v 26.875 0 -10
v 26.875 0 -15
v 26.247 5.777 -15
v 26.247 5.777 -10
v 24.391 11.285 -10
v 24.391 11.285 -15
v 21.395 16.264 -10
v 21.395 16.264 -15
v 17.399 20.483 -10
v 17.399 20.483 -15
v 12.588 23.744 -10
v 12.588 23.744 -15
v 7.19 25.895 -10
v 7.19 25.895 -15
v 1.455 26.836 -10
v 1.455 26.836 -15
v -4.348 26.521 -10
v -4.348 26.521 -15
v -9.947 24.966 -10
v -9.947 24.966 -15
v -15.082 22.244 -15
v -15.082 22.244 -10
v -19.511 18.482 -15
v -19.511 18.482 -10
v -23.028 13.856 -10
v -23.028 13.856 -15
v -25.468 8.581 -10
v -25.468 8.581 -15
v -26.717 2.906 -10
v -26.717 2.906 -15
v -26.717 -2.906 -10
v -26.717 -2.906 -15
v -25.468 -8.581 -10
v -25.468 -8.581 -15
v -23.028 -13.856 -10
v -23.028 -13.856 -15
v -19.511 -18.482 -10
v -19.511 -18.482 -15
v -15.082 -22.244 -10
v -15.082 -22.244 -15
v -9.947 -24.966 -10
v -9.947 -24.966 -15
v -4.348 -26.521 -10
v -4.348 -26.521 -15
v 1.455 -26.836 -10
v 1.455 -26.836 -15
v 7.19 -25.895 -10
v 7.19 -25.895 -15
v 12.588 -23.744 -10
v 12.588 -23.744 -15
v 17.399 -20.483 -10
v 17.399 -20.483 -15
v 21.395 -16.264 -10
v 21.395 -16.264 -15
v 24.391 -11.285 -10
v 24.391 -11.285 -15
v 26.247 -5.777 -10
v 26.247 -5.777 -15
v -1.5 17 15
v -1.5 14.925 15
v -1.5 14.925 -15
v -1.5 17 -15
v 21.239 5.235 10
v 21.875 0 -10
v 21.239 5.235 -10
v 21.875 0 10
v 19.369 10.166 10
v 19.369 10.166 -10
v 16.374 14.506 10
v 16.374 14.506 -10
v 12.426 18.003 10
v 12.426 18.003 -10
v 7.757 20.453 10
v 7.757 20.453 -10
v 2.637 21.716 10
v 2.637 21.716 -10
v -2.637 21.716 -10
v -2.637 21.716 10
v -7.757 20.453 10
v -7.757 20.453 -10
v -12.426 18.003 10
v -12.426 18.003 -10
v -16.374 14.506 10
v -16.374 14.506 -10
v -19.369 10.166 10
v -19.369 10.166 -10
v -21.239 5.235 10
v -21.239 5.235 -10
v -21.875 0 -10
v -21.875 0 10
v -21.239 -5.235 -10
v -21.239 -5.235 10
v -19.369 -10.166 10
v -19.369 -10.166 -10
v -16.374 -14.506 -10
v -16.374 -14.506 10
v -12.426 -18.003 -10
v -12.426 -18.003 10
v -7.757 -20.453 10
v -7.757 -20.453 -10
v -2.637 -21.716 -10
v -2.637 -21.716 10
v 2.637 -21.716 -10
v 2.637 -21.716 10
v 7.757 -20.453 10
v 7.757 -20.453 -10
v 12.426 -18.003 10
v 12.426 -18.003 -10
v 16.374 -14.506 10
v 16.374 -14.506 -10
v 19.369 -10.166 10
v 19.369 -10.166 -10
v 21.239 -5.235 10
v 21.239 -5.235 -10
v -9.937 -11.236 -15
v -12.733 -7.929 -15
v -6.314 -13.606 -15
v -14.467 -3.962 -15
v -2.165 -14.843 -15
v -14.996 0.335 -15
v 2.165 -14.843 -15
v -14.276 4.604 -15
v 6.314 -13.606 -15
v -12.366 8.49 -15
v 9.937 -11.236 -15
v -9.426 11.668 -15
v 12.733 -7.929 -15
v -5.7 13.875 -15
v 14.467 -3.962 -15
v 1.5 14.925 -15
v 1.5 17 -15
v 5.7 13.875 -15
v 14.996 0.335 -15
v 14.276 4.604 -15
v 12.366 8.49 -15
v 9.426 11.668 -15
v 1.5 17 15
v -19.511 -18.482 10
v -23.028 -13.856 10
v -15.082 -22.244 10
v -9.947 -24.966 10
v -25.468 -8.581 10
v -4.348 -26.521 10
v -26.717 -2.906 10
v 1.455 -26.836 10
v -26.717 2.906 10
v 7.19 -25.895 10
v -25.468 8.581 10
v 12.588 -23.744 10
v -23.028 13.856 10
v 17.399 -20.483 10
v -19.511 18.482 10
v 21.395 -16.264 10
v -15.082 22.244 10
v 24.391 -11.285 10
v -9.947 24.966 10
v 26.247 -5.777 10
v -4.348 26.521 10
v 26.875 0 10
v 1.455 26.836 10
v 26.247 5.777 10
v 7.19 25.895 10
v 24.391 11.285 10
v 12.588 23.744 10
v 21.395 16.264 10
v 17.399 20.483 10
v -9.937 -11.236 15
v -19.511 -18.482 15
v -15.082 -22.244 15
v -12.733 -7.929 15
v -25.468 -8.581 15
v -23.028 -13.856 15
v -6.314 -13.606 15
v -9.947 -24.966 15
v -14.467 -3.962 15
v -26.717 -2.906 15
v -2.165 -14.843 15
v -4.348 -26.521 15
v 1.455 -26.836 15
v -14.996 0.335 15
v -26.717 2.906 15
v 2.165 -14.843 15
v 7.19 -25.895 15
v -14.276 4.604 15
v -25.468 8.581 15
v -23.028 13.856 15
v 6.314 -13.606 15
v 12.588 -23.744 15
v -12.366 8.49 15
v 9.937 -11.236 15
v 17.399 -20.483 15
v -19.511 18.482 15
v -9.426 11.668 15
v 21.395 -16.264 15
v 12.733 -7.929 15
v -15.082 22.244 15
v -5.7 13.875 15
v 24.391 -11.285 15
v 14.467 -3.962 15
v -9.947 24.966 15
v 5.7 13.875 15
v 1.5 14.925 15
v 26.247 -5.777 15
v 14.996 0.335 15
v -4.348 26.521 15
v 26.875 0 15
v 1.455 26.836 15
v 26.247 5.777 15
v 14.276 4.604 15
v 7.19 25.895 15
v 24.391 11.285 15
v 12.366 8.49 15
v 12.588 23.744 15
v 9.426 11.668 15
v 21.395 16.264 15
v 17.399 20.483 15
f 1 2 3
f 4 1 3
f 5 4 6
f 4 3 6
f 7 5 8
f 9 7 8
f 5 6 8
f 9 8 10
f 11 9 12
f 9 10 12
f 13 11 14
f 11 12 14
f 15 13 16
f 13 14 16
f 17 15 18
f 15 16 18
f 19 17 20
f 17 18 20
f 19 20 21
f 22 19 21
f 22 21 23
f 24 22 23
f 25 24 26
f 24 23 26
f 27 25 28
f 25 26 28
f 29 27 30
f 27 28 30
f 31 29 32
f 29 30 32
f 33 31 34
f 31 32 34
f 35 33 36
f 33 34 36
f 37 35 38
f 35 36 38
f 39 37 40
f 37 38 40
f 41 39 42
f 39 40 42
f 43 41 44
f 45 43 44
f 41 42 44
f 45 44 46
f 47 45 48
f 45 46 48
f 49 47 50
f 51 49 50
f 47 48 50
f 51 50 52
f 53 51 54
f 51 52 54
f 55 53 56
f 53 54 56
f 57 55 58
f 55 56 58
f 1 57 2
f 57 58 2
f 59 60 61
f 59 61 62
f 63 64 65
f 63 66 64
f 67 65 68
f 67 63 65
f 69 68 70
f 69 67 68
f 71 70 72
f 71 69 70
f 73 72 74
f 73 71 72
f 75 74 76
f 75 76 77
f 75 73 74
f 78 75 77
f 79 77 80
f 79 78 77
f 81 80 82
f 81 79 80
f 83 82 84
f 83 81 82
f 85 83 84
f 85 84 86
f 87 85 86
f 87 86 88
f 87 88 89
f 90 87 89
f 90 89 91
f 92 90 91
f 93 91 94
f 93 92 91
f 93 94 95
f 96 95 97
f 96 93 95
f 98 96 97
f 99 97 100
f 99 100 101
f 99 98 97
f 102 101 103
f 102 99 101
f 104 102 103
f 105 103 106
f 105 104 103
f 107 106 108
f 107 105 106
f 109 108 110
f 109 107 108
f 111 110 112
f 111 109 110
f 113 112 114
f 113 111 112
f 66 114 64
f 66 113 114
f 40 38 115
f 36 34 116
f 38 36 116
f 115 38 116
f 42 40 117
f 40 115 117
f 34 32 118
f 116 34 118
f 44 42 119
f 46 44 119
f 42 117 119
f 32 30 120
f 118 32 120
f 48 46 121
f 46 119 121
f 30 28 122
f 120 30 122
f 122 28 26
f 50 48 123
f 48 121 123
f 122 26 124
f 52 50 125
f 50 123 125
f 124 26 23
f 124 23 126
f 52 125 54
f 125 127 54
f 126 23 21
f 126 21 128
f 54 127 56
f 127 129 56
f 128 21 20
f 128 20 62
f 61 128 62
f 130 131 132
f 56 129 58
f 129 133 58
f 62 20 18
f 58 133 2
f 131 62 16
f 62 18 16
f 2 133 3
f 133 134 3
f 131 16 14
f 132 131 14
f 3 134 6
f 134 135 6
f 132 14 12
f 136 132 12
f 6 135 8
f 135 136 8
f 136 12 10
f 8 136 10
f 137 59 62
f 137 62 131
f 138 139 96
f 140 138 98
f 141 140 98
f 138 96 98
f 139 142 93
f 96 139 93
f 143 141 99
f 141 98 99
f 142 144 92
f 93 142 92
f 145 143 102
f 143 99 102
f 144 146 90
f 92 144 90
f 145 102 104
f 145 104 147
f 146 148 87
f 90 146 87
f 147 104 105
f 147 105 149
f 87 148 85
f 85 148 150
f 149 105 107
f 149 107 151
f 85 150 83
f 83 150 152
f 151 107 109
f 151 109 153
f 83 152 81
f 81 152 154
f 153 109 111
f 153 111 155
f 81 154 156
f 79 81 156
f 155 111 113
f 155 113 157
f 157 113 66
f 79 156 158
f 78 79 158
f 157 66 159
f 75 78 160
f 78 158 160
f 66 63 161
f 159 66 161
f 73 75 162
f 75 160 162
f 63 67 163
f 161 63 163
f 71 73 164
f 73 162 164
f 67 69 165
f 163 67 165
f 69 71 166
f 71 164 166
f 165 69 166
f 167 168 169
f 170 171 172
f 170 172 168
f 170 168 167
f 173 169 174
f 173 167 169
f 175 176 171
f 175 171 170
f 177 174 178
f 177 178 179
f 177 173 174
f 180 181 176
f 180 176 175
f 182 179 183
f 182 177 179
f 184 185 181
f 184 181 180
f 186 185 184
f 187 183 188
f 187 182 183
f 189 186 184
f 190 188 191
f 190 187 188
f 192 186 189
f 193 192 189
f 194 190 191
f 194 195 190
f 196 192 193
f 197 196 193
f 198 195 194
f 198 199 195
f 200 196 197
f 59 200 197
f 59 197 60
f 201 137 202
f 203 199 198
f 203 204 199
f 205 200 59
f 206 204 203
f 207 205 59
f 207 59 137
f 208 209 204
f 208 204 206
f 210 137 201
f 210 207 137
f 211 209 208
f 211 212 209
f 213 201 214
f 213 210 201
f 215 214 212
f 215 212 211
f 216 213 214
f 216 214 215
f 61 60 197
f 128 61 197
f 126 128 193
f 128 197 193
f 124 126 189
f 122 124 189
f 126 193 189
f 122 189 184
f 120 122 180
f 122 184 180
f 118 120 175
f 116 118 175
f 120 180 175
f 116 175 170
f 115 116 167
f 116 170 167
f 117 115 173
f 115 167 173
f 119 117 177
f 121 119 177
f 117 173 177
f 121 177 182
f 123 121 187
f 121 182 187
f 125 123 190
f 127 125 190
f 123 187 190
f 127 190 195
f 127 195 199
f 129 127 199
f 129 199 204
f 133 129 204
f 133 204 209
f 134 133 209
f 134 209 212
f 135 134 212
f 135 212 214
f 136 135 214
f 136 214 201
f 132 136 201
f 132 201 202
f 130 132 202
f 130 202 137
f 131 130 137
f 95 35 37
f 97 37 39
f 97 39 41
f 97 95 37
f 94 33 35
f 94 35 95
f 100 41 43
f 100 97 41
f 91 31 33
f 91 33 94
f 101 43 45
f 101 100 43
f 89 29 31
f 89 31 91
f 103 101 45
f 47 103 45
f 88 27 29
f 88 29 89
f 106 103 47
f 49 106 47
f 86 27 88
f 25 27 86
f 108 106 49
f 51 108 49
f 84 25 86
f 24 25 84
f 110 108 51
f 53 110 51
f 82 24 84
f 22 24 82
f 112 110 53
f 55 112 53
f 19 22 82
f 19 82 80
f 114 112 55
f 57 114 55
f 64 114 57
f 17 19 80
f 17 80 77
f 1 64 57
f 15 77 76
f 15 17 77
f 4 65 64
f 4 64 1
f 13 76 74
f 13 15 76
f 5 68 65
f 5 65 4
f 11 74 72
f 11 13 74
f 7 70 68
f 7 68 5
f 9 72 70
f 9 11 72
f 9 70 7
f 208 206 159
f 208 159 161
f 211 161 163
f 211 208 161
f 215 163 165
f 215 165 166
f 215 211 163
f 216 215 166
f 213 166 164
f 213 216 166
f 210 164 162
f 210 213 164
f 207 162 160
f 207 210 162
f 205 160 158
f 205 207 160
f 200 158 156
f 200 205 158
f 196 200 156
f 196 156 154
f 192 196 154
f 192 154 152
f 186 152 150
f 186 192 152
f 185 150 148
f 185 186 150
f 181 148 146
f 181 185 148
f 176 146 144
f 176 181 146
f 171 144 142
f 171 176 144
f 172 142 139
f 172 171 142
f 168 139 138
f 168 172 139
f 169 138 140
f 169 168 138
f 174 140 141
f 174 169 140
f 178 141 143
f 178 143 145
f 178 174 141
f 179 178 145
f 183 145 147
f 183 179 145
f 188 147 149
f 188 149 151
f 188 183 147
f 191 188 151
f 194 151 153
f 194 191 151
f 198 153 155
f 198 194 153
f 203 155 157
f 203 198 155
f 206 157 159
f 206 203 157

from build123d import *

# Parameters (mm, degrees)
SKETCH_1_R               = 21.875
EXTRUDE_1_DEPTH          = 15
PATTERN_CIRCULAR_1_COUNT = 20
SKETCH_3_R               = 15
CUT_EXTRUDE_1_DEPTH      = 44.09328544
CUT_EXTRUDE_4_DEPTH      = 35.380681349
CUT_EXTRUDE_4_DEPTH_BACK = 35.380681349
SKETCH_6_W               = 3
SKETCH_6_H               = 17
SKETCH_7_R               = 26.875
SKETCH_7_R_2             = 21.875
EXTRUDE_2_DEPTH          = 5


with BuildPart() as part:
    # 草图1 → 凸台-拉伸1 (new, symmetric)
    with BuildSketch(Plane.XY):
        Circle(SKETCH_1_R)
    extrude(amount=EXTRUDE_1_DEPTH, both=True)


with BuildPart() as pattern_circular_1_1:
    # 阵列(圆周)1: pattern copy
    add(part.part.rotate(Axis((0, 0, 15), (0, 0, 1)), 1 * 360 / PATTERN_CIRCULAR_1_COUNT))


with BuildPart() as pattern_circular_1_2:
    # 阵列(圆周)1: pattern copy
    add(part.part.rotate(Axis((0, 0, 15), (0, 0, 1)), 2 * 360 / PATTERN_CIRCULAR_1_COUNT))


with BuildPart() as pattern_circular_1_3:
    # 阵列(圆周)1: pattern copy
    add(part.part.rotate(Axis((0, 0, 15), (0, 0, 1)), 3 * 360 / PATTERN_CIRCULAR_1_COUNT))


with BuildPart() as pattern_circular_1_4:
    # 阵列(圆周)1: pattern copy
    add(part.part.rotate(Axis((0, 0, 15), (0, 0, 1)), 4 * 360 / PATTERN_CIRCULAR_1_COUNT))


with BuildPart() as pattern_circular_1_5:
    # 阵列(圆周)1: pattern copy
    add(part.part.rotate(Axis((0, 0, 15), (0, 0, 1)), 5 * 360 / PATTERN_CIRCULAR_1_COUNT))


with BuildPart() as pattern_circular_1_6:
    # 阵列(圆周)1: pattern copy
    add(part.part.rotate(Axis((0, 0, 15), (0, 0, 1)), 6 * 360 / PATTERN_CIRCULAR_1_COUNT))


with BuildPart() as pattern_circular_1_7:
    # 阵列(圆周)1: pattern copy
    add(part.part.rotate(Axis((0, 0, 15), (0, 0, 1)), 7 * 360 / PATTERN_CIRCULAR_1_COUNT))


with BuildPart() as pattern_circular_1_8:
    # 阵列(圆周)1: pattern copy
    add(part.part.rotate(Axis((0, 0, 15), (0, 0, 1)), 8 * 360 / PATTERN_CIRCULAR_1_COUNT))


with BuildPart() as pattern_circular_1_9:
    # 阵列(圆周)1: pattern copy
    add(part.part.rotate(Axis((0, 0, 15), (0, 0, 1)), 9 * 360 / PATTERN_CIRCULAR_1_COUNT))


with BuildPart() as pattern_circular_1_10:
    # 阵列(圆周)1: pattern copy
    add(part.part.rotate(Axis((0, 0, 15), (0, 0, 1)), 10 * 360 / PATTERN_CIRCULAR_1_COUNT))


with BuildPart() as pattern_circular_1_11:
    # 阵列(圆周)1: pattern copy
    add(part.part.rotate(Axis((0, 0, 15), (0, 0, 1)), 11 * 360 / PATTERN_CIRCULAR_1_COUNT))


with BuildPart() as pattern_circular_1_12:
    # 阵列(圆周)1: pattern copy
    add(part.part.rotate(Axis((0, 0, 15), (0, 0, 1)), 12 * 360 / PATTERN_CIRCULAR_1_COUNT))


with BuildPart() as pattern_circular_1_13:
    # 阵列(圆周)1: pattern copy
    add(part.part.rotate(Axis((0, 0, 15), (0, 0, 1)), 13 * 360 / PATTERN_CIRCULAR_1_COUNT))


with BuildPart() as pattern_circular_1_14:
    # 阵列(圆周)1: pattern copy
    add(part.part.rotate(Axis((0, 0, 15), (0, 0, 1)), 14 * 360 / PATTERN_CIRCULAR_1_COUNT))


with BuildPart() as pattern_circular_1_15:
    # 阵列(圆周)1: pattern copy
    add(part.part.rotate(Axis((0, 0, 15), (0, 0, 1)), 15 * 360 / PATTERN_CIRCULAR_1_COUNT))


with BuildPart() as pattern_circular_1_16:
    # 阵列(圆周)1: pattern copy
    add(part.part.rotate(Axis((0, 0, 15), (0, 0, 1)), 16 * 360 / PATTERN_CIRCULAR_1_COUNT))


with BuildPart() as pattern_circular_1_17:
    # 阵列(圆周)1: pattern copy
    add(part.part.rotate(Axis((0, 0, 15), (0, 0, 1)), 17 * 360 / PATTERN_CIRCULAR_1_COUNT))


with BuildPart() as pattern_circular_1_18:
    # 阵列(圆周)1: pattern copy
    add(part.part.rotate(Axis((0, 0, 15), (0, 0, 1)), 18 * 360 / PATTERN_CIRCULAR_1_COUNT))


with BuildPart() as pattern_circular_1_19:
    # 阵列(圆周)1: pattern copy
    add(part.part.rotate(Axis((0, 0, 15), (0, 0, 1)), 19 * 360 / PATTERN_CIRCULAR_1_COUNT))


with BuildPart() as cut_extrude_1_tool:
    # 草图3 → 切除-拉伸1 (new, through all)
    with BuildSketch(Plane.XY.offset(15)):
        Circle(SKETCH_3_R)
    extrude(amount=-CUT_EXTRUDE_1_DEPTH)


with BuildPart() as part_1:
    add(part.part)

    # 切除-拉伸1: cut by cut_extrude_1_tool
    add(cut_extrude_1_tool.part, mode=Mode.SUBTRACT)


with BuildPart() as pattern_circular_1_1_1:
    add(pattern_circular_1_1.part)

    # 切除-拉伸1: cut by cut_extrude_1_tool
    add(cut_extrude_1_tool.part, mode=Mode.SUBTRACT)


with BuildPart() as pattern_circular_1_2_1:
    add(pattern_circular_1_2.part)

    # 切除-拉伸1: cut by cut_extrude_1_tool
    add(cut_extrude_1_tool.part, mode=Mode.SUBTRACT)


with BuildPart() as pattern_circular_1_3_1:
    add(pattern_circular_1_3.part)

    # 切除-拉伸1: cut by cut_extrude_1_tool
    add(cut_extrude_1_tool.part, mode=Mode.SUBTRACT)


with BuildPart() as pattern_circular_1_4_1:
    add(pattern_circular_1_4.part)

    # 切除-拉伸1: cut by cut_extrude_1_tool
    add(cut_extrude_1_tool.part, mode=Mode.SUBTRACT)


with BuildPart() as pattern_circular_1_5_1:
    add(pattern_circular_1_5.part)

    # 切除-拉伸1: cut by cut_extrude_1_tool
    add(cut_extrude_1_tool.part, mode=Mode.SUBTRACT)


with BuildPart() as pattern_circular_1_6_1:
    add(pattern_circular_1_6.part)

    # 切除-拉伸1: cut by cut_extrude_1_tool
    add(cut_extrude_1_tool.part, mode=Mode.SUBTRACT)


with BuildPart() as pattern_circular_1_7_1:
    add(pattern_circular_1_7.part)

    # 切除-拉伸1: cut by cut_extrude_1_tool
    add(cut_extrude_1_tool.part, mode=Mode.SUBTRACT)


with BuildPart() as pattern_circular_1_8_1:
    add(pattern_circular_1_8.part)

    # 切除-拉伸1: cut by cut_extrude_1_tool
    add(cut_extrude_1_tool.part, mode=Mode.SUBTRACT)


with BuildPart() as pattern_circular_1_9_1:
    add(pattern_circular_1_9.part)

    # 切除-拉伸1: cut by cut_extrude_1_tool
    add(cut_extrude_1_tool.part, mode=Mode.SUBTRACT)


with BuildPart() as pattern_circular_1_10_1:
    add(pattern_circular_1_10.part)

    # 切除-拉伸1: cut by cut_extrude_1_tool
    add(cut_extrude_1_tool.part, mode=Mode.SUBTRACT)


with BuildPart() as pattern_circular_1_11_1:
    add(pattern_circular_1_11.part)

    # 切除-拉伸1: cut by cut_extrude_1_tool
    add(cut_extrude_1_tool.part, mode=Mode.SUBTRACT)


with BuildPart() as pattern_circular_1_12_1:
    add(pattern_circular_1_12.part)

    # 切除-拉伸1: cut by cut_extrude_1_tool
    add(cut_extrude_1_tool.part, mode=Mode.SUBTRACT)


with BuildPart() as pattern_circular_1_13_1:
    add(pattern_circular_1_13.part)

    # 切除-拉伸1: cut by cut_extrude_1_tool
    add(cut_extrude_1_tool.part, mode=Mode.SUBTRACT)


with BuildPart() as pattern_circular_1_14_1:
    add(pattern_circular_1_14.part)

    # 切除-拉伸1: cut by cut_extrude_1_tool
    add(cut_extrude_1_tool.part, mode=Mode.SUBTRACT)


with BuildPart() as pattern_circular_1_15_1:
    add(pattern_circular_1_15.part)

    # 切除-拉伸1: cut by cut_extrude_1_tool
    add(cut_extrude_1_tool.part, mode=Mode.SUBTRACT)


with BuildPart() as pattern_circular_1_16_1:
    add(pattern_circular_1_16.part)

    # 切除-拉伸1: cut by cut_extrude_1_tool
    add(cut_extrude_1_tool.part, mode=Mode.SUBTRACT)


with BuildPart() as pattern_circular_1_17_1:
    add(pattern_circular_1_17.part)

    # 切除-拉伸1: cut by cut_extrude_1_tool
    add(cut_extrude_1_tool.part, mode=Mode.SUBTRACT)


with BuildPart() as pattern_circular_1_18_1:
    add(pattern_circular_1_18.part)

    # 切除-拉伸1: cut by cut_extrude_1_tool
    add(cut_extrude_1_tool.part, mode=Mode.SUBTRACT)


with BuildPart() as pattern_circular_1_19_1:
    add(pattern_circular_1_19.part)

    # 切除-拉伸1: cut by cut_extrude_1_tool
    add(cut_extrude_1_tool.part, mode=Mode.SUBTRACT)


with BuildPart() as cut_extrude_4_tool:
    # 草图6 → 切除-拉伸4 (new, two sides: drawn at the far end of the back side and taken through both)
    with BuildSketch(Plane.XY.offset(-CUT_EXTRUDE_4_DEPTH_BACK)):
        with Locations((0, 8.5)):
            Rectangle(SKETCH_6_W, SKETCH_6_H)
    extrude(amount=CUT_EXTRUDE_4_DEPTH + CUT_EXTRUDE_4_DEPTH_BACK)


with BuildPart() as part_2:
    add(part_1.part)

    # 切除-拉伸4: cut by cut_extrude_4_tool
    add(cut_extrude_4_tool.part, mode=Mode.SUBTRACT)



with BuildPart() as pattern_circular_1_1_2:
    add(pattern_circular_1_1_1.part)

    # 切除-拉伸4: cut by cut_extrude_4_tool
    add(cut_extrude_4_tool.part, mode=Mode.SUBTRACT)


with BuildPart() as pattern_circular_1_2_2:
    add(pattern_circular_1_2_1.part)

    # 切除-拉伸4: cut by cut_extrude_4_tool
    add(cut_extrude_4_tool.part, mode=Mode.SUBTRACT)


with BuildPart() as pattern_circular_1_3_2:
    add(pattern_circular_1_3_1.part)

    # 切除-拉伸4: cut by cut_extrude_4_tool
    add(cut_extrude_4_tool.part, mode=Mode.SUBTRACT)


with BuildPart() as pattern_circular_1_4_2:
    add(pattern_circular_1_4_1.part)

    # 切除-拉伸4: cut by cut_extrude_4_tool
    add(cut_extrude_4_tool.part, mode=Mode.SUBTRACT)


with BuildPart() as pattern_circular_1_5_2:
    add(pattern_circular_1_5_1.part)

    # 切除-拉伸4: cut by cut_extrude_4_tool
    add(cut_extrude_4_tool.part, mode=Mode.SUBTRACT)


with BuildPart() as pattern_circular_1_6_2:
    add(pattern_circular_1_6_1.part)

    # 切除-拉伸4: cut by cut_extrude_4_tool
    add(cut_extrude_4_tool.part, mode=Mode.SUBTRACT)


with BuildPart() as pattern_circular_1_7_2:
    add(pattern_circular_1_7_1.part)

    # 切除-拉伸4: cut by cut_extrude_4_tool
    add(cut_extrude_4_tool.part, mode=Mode.SUBTRACT)


with BuildPart() as pattern_circular_1_8_2:
    add(pattern_circular_1_8_1.part)

    # 切除-拉伸4: cut by cut_extrude_4_tool
    add(cut_extrude_4_tool.part, mode=Mode.SUBTRACT)


with BuildPart() as pattern_circular_1_9_2:
    add(pattern_circular_1_9_1.part)

    # 切除-拉伸4: cut by cut_extrude_4_tool
    add(cut_extrude_4_tool.part, mode=Mode.SUBTRACT)


with BuildPart() as pattern_circular_1_10_2:
    add(pattern_circular_1_10_1.part)

    # 切除-拉伸4: cut by cut_extrude_4_tool
    add(cut_extrude_4_tool.part, mode=Mode.SUBTRACT)


with BuildPart() as pattern_circular_1_11_2:
    add(pattern_circular_1_11_1.part)

    # 切除-拉伸4: cut by cut_extrude_4_tool
    add(cut_extrude_4_tool.part, mode=Mode.SUBTRACT)


with BuildPart() as pattern_circular_1_12_2:
    add(pattern_circular_1_12_1.part)

    # 切除-拉伸4: cut by cut_extrude_4_tool
    add(cut_extrude_4_tool.part, mode=Mode.SUBTRACT)


with BuildPart() as pattern_circular_1_13_2:
    add(pattern_circular_1_13_1.part)

    # 切除-拉伸4: cut by cut_extrude_4_tool
    add(cut_extrude_4_tool.part, mode=Mode.SUBTRACT)


with BuildPart() as pattern_circular_1_14_2:
    add(pattern_circular_1_14_1.part)

    # 切除-拉伸4: cut by cut_extrude_4_tool
    add(cut_extrude_4_tool.part, mode=Mode.SUBTRACT)


with BuildPart() as pattern_circular_1_15_2:
    add(pattern_circular_1_15_1.part)

    # 切除-拉伸4: cut by cut_extrude_4_tool
    add(cut_extrude_4_tool.part, mode=Mode.SUBTRACT)


with BuildPart() as pattern_circular_1_16_2:
    add(pattern_circular_1_16_1.part)

    # 切除-拉伸4: cut by cut_extrude_4_tool
    add(cut_extrude_4_tool.part, mode=Mode.SUBTRACT)


with BuildPart() as pattern_circular_1_17_2:
    add(pattern_circular_1_17_1.part)

    # 切除-拉伸4: cut by cut_extrude_4_tool
    add(cut_extrude_4_tool.part, mode=Mode.SUBTRACT)


with BuildPart() as pattern_circular_1_18_2:
    add(pattern_circular_1_18_1.part)

    # 切除-拉伸4: cut by cut_extrude_4_tool
    add(cut_extrude_4_tool.part, mode=Mode.SUBTRACT)


with BuildPart() as pattern_circular_1_19_2:
    add(pattern_circular_1_19_1.part)

    # 切除-拉伸4: cut by cut_extrude_4_tool
    add(cut_extrude_4_tool.part, mode=Mode.SUBTRACT)


with BuildPart() as part_3:
    add(part_2.part)

    add(pattern_circular_1_1_2.part)  # 凸台-拉伸2 merges 阵列(圆周)1_1

    add(pattern_circular_1_2_2.part)  # 凸台-拉伸2 merges 阵列(圆周)1_2

    add(pattern_circular_1_3_2.part)  # 凸台-拉伸2 merges 阵列(圆周)1_3

    add(pattern_circular_1_4_2.part)  # 凸台-拉伸2 merges 阵列(圆周)1_4

    add(pattern_circular_1_5_2.part)  # 凸台-拉伸2 merges 阵列(圆周)1_5

    add(pattern_circular_1_6_2.part)  # 凸台-拉伸2 merges 阵列(圆周)1_6

    add(pattern_circular_1_7_2.part)  # 凸台-拉伸2 merges 阵列(圆周)1_7

    add(pattern_circular_1_8_2.part)  # 凸台-拉伸2 merges 阵列(圆周)1_8

    add(pattern_circular_1_9_2.part)  # 凸台-拉伸2 merges 阵列(圆周)1_9

    add(pattern_circular_1_10_2.part)  # 凸台-拉伸2 merges 阵列(圆周)1_10

    add(pattern_circular_1_11_2.part)  # 凸台-拉伸2 merges 阵列(圆周)1_11

    add(pattern_circular_1_12_2.part)  # 凸台-拉伸2 merges 阵列(圆周)1_12

    add(pattern_circular_1_13_2.part)  # 凸台-拉伸2 merges 阵列(圆周)1_13

    add(pattern_circular_1_14_2.part)  # 凸台-拉伸2 merges 阵列(圆周)1_14

    add(pattern_circular_1_15_2.part)  # 凸台-拉伸2 merges 阵列(圆周)1_15

    add(pattern_circular_1_16_2.part)  # 凸台-拉伸2 merges 阵列(圆周)1_16

    add(pattern_circular_1_17_2.part)  # 凸台-拉伸2 merges 阵列(圆周)1_17

    add(pattern_circular_1_18_2.part)  # 凸台-拉伸2 merges 阵列(圆周)1_18

    add(pattern_circular_1_19_2.part)  # 凸台-拉伸2 merges 阵列(圆周)1_19
    # 草图7 → 凸台-拉伸2 (add)
    with BuildSketch(Plane.XY.offset(15)):
        Circle(SKETCH_7_R)
        Circle(SKETCH_7_R_2, mode=Mode.SUBTRACT)
    extrude_2 = extrude(amount=-EXTRUDE_2_DEPTH)

    # 镜向1: 凸台-拉伸2 across plane
    add(extrude_2.mirror(Plane.XY))


solid = part_3.part
